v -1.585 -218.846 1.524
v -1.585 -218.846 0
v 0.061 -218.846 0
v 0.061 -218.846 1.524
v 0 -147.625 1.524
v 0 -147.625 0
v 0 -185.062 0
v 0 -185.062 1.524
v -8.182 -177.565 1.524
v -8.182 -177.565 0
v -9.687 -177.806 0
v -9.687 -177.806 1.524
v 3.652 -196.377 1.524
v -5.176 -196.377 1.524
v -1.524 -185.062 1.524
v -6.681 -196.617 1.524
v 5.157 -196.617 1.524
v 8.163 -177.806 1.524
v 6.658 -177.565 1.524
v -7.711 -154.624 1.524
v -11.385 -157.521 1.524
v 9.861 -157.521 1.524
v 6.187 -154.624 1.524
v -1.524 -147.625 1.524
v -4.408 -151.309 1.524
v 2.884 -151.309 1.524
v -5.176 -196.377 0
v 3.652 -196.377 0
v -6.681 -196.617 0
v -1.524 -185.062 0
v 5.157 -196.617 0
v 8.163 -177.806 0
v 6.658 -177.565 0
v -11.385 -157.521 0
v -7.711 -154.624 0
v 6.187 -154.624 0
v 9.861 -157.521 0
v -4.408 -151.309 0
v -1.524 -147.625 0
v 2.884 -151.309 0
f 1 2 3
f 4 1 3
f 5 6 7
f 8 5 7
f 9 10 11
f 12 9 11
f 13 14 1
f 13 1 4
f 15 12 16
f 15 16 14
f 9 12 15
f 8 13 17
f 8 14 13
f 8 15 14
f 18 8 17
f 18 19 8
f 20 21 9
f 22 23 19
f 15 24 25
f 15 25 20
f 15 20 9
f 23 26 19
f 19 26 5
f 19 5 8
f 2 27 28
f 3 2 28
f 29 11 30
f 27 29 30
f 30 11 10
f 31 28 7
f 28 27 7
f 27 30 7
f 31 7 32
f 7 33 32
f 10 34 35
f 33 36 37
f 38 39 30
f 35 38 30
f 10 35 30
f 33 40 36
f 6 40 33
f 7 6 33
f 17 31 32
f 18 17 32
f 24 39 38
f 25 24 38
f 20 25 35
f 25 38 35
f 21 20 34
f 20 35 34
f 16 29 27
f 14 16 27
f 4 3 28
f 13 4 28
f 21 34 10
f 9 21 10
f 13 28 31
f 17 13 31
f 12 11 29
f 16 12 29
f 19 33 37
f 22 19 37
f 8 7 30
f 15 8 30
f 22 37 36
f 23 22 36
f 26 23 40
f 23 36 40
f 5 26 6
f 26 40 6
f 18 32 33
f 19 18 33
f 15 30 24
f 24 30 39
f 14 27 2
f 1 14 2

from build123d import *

# Parameters (mm, degrees)
BOSS_EXTRUDE1_DEPTH = 1.524


with BuildPart() as part:
    # Sketch1 → Boss-Extrude1 (new body)
    with BuildSketch(Plane.XY):
        with BuildLine():
            Line((0, -185.062075144), (-1.524, -185.062075144))
            Line((-1.524, -185.062075144), (-1.524, -147.624689716))
            ThreePointArc((-1.524, -147.624689716), (-6.010146882, -153.015597415), (-11.384626883, -157.521411923))
            Line((-11.384626883, -157.521411923), (-8.18166696, -177.565293098))
            Line((-8.18166696, -177.565293098), (-9.686574021, -177.80577332))
            Line((-9.686574021, -177.80577332), (-6.680571239, -196.617111584))
            Line((-6.680571239, -196.617111584), (-5.175664178, -196.376631362))
            Line((-5.175664178, -196.376631362), (-1.585117021, -218.846004156))
            Line((-1.585117021, -218.846004156), (0.061117021, -218.846004156))
            Line((0.061117021, -218.846004156), (3.651664178, -196.376631362))
            Line((3.651664178, -196.376631362), (5.156571239, -196.617111584))
            Line((5.156571239, -196.617111584), (8.162574021, -177.80577332))
            Line((8.162574021, -177.80577332), (6.65766696, -177.565293098))
            Line((6.65766696, -177.565293098), (9.860626883, -157.521411923))
            ThreePointArc((9.860626883, -157.521411923), (4.486146882, -153.015597415), (0, -147.624689716))
            Line((0, -147.624689716), (0, -185.062075144))
        make_face()
    extrude(amount=BOSS_EXTRUDE1_DEPTH)


solid = part.part
